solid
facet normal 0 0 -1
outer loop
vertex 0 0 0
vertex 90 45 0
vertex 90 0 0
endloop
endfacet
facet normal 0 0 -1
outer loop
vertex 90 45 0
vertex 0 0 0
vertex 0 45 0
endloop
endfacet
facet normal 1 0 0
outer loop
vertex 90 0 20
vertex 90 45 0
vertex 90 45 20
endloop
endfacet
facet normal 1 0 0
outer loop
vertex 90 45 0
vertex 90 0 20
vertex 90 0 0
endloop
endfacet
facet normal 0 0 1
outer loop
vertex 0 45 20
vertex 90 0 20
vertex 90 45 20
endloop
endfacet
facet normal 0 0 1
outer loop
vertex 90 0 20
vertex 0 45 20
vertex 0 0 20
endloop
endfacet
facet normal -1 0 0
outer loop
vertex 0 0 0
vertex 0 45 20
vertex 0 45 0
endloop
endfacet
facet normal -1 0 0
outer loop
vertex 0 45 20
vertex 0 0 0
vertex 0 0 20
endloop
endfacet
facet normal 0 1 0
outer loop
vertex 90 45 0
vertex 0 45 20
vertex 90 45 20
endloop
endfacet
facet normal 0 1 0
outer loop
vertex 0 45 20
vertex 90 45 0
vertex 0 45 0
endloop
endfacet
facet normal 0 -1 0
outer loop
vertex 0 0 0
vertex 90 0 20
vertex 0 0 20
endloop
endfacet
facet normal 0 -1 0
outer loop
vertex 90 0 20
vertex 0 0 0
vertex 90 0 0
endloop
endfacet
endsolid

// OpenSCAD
// Dimensions for the drying rack
$fn = 64; // Smooth curves

// Base block dimensions
base_length = 90;   // X direction
base_width = 45;    // Y direction
base_height = 20;   // Z direction

// Slot dimensions
slot_length = 77;     // Along X
slot_width = 1.6;     // Y direction (width of slot)
slot_depth = 10;      // Z direction (depth into top face)

// Spacing between slots (center-to-center in Y)
slot_spacing = 3.5;

// Number of slots
num_slots = 10;

// Calculate total width occupied by slots (center-to-center)
total_slot_width = (num_slots - 1) * slot_spacing + slot_width;

// Centering offset for slots in Y
y_offset = (base_width - total_slot_width) / 2;

// Centering offset for slots in X
x_offset = (base_length - slot_length) / 2;

// Create the base block, placed so that it sits on the build plate at z = 0
// The base extends from z = 0 to z = base_height = 20
// So we place the cube with its bottom at z = 0, centered in X and Y
translate([0, 0, 0]) {
    cube(size = [base_length, base_width, base_height], center = false);
}

// Cut the slots using difference
difference() {
    // Keep the base block (now sitting on z=0)
    translate([0, 0, 0]) {
        cube(size = [base_length, base_width, base_height], center = false);
    }

    // For each slot, create a rectangular prism to cut out
    for (i = [0 : num_slots - 1]) {
        // Calculate Y position of this slot (center-to-center spacing)
        y_pos = y_offset + i * slot_spacing;

        // Create a rectangular prism for the slot
        // Cut from z = 0 up to z = slot_depth (so it's 10 mm deep from the top)
        // The slot runs along X, so we center it in X at the correct offset
        translate([x_offset, y_pos, 0]) {
            cube(size = [slot_length, slot_width + 0.02, slot_depth + 0.02], center = false);
        }
    }
}
